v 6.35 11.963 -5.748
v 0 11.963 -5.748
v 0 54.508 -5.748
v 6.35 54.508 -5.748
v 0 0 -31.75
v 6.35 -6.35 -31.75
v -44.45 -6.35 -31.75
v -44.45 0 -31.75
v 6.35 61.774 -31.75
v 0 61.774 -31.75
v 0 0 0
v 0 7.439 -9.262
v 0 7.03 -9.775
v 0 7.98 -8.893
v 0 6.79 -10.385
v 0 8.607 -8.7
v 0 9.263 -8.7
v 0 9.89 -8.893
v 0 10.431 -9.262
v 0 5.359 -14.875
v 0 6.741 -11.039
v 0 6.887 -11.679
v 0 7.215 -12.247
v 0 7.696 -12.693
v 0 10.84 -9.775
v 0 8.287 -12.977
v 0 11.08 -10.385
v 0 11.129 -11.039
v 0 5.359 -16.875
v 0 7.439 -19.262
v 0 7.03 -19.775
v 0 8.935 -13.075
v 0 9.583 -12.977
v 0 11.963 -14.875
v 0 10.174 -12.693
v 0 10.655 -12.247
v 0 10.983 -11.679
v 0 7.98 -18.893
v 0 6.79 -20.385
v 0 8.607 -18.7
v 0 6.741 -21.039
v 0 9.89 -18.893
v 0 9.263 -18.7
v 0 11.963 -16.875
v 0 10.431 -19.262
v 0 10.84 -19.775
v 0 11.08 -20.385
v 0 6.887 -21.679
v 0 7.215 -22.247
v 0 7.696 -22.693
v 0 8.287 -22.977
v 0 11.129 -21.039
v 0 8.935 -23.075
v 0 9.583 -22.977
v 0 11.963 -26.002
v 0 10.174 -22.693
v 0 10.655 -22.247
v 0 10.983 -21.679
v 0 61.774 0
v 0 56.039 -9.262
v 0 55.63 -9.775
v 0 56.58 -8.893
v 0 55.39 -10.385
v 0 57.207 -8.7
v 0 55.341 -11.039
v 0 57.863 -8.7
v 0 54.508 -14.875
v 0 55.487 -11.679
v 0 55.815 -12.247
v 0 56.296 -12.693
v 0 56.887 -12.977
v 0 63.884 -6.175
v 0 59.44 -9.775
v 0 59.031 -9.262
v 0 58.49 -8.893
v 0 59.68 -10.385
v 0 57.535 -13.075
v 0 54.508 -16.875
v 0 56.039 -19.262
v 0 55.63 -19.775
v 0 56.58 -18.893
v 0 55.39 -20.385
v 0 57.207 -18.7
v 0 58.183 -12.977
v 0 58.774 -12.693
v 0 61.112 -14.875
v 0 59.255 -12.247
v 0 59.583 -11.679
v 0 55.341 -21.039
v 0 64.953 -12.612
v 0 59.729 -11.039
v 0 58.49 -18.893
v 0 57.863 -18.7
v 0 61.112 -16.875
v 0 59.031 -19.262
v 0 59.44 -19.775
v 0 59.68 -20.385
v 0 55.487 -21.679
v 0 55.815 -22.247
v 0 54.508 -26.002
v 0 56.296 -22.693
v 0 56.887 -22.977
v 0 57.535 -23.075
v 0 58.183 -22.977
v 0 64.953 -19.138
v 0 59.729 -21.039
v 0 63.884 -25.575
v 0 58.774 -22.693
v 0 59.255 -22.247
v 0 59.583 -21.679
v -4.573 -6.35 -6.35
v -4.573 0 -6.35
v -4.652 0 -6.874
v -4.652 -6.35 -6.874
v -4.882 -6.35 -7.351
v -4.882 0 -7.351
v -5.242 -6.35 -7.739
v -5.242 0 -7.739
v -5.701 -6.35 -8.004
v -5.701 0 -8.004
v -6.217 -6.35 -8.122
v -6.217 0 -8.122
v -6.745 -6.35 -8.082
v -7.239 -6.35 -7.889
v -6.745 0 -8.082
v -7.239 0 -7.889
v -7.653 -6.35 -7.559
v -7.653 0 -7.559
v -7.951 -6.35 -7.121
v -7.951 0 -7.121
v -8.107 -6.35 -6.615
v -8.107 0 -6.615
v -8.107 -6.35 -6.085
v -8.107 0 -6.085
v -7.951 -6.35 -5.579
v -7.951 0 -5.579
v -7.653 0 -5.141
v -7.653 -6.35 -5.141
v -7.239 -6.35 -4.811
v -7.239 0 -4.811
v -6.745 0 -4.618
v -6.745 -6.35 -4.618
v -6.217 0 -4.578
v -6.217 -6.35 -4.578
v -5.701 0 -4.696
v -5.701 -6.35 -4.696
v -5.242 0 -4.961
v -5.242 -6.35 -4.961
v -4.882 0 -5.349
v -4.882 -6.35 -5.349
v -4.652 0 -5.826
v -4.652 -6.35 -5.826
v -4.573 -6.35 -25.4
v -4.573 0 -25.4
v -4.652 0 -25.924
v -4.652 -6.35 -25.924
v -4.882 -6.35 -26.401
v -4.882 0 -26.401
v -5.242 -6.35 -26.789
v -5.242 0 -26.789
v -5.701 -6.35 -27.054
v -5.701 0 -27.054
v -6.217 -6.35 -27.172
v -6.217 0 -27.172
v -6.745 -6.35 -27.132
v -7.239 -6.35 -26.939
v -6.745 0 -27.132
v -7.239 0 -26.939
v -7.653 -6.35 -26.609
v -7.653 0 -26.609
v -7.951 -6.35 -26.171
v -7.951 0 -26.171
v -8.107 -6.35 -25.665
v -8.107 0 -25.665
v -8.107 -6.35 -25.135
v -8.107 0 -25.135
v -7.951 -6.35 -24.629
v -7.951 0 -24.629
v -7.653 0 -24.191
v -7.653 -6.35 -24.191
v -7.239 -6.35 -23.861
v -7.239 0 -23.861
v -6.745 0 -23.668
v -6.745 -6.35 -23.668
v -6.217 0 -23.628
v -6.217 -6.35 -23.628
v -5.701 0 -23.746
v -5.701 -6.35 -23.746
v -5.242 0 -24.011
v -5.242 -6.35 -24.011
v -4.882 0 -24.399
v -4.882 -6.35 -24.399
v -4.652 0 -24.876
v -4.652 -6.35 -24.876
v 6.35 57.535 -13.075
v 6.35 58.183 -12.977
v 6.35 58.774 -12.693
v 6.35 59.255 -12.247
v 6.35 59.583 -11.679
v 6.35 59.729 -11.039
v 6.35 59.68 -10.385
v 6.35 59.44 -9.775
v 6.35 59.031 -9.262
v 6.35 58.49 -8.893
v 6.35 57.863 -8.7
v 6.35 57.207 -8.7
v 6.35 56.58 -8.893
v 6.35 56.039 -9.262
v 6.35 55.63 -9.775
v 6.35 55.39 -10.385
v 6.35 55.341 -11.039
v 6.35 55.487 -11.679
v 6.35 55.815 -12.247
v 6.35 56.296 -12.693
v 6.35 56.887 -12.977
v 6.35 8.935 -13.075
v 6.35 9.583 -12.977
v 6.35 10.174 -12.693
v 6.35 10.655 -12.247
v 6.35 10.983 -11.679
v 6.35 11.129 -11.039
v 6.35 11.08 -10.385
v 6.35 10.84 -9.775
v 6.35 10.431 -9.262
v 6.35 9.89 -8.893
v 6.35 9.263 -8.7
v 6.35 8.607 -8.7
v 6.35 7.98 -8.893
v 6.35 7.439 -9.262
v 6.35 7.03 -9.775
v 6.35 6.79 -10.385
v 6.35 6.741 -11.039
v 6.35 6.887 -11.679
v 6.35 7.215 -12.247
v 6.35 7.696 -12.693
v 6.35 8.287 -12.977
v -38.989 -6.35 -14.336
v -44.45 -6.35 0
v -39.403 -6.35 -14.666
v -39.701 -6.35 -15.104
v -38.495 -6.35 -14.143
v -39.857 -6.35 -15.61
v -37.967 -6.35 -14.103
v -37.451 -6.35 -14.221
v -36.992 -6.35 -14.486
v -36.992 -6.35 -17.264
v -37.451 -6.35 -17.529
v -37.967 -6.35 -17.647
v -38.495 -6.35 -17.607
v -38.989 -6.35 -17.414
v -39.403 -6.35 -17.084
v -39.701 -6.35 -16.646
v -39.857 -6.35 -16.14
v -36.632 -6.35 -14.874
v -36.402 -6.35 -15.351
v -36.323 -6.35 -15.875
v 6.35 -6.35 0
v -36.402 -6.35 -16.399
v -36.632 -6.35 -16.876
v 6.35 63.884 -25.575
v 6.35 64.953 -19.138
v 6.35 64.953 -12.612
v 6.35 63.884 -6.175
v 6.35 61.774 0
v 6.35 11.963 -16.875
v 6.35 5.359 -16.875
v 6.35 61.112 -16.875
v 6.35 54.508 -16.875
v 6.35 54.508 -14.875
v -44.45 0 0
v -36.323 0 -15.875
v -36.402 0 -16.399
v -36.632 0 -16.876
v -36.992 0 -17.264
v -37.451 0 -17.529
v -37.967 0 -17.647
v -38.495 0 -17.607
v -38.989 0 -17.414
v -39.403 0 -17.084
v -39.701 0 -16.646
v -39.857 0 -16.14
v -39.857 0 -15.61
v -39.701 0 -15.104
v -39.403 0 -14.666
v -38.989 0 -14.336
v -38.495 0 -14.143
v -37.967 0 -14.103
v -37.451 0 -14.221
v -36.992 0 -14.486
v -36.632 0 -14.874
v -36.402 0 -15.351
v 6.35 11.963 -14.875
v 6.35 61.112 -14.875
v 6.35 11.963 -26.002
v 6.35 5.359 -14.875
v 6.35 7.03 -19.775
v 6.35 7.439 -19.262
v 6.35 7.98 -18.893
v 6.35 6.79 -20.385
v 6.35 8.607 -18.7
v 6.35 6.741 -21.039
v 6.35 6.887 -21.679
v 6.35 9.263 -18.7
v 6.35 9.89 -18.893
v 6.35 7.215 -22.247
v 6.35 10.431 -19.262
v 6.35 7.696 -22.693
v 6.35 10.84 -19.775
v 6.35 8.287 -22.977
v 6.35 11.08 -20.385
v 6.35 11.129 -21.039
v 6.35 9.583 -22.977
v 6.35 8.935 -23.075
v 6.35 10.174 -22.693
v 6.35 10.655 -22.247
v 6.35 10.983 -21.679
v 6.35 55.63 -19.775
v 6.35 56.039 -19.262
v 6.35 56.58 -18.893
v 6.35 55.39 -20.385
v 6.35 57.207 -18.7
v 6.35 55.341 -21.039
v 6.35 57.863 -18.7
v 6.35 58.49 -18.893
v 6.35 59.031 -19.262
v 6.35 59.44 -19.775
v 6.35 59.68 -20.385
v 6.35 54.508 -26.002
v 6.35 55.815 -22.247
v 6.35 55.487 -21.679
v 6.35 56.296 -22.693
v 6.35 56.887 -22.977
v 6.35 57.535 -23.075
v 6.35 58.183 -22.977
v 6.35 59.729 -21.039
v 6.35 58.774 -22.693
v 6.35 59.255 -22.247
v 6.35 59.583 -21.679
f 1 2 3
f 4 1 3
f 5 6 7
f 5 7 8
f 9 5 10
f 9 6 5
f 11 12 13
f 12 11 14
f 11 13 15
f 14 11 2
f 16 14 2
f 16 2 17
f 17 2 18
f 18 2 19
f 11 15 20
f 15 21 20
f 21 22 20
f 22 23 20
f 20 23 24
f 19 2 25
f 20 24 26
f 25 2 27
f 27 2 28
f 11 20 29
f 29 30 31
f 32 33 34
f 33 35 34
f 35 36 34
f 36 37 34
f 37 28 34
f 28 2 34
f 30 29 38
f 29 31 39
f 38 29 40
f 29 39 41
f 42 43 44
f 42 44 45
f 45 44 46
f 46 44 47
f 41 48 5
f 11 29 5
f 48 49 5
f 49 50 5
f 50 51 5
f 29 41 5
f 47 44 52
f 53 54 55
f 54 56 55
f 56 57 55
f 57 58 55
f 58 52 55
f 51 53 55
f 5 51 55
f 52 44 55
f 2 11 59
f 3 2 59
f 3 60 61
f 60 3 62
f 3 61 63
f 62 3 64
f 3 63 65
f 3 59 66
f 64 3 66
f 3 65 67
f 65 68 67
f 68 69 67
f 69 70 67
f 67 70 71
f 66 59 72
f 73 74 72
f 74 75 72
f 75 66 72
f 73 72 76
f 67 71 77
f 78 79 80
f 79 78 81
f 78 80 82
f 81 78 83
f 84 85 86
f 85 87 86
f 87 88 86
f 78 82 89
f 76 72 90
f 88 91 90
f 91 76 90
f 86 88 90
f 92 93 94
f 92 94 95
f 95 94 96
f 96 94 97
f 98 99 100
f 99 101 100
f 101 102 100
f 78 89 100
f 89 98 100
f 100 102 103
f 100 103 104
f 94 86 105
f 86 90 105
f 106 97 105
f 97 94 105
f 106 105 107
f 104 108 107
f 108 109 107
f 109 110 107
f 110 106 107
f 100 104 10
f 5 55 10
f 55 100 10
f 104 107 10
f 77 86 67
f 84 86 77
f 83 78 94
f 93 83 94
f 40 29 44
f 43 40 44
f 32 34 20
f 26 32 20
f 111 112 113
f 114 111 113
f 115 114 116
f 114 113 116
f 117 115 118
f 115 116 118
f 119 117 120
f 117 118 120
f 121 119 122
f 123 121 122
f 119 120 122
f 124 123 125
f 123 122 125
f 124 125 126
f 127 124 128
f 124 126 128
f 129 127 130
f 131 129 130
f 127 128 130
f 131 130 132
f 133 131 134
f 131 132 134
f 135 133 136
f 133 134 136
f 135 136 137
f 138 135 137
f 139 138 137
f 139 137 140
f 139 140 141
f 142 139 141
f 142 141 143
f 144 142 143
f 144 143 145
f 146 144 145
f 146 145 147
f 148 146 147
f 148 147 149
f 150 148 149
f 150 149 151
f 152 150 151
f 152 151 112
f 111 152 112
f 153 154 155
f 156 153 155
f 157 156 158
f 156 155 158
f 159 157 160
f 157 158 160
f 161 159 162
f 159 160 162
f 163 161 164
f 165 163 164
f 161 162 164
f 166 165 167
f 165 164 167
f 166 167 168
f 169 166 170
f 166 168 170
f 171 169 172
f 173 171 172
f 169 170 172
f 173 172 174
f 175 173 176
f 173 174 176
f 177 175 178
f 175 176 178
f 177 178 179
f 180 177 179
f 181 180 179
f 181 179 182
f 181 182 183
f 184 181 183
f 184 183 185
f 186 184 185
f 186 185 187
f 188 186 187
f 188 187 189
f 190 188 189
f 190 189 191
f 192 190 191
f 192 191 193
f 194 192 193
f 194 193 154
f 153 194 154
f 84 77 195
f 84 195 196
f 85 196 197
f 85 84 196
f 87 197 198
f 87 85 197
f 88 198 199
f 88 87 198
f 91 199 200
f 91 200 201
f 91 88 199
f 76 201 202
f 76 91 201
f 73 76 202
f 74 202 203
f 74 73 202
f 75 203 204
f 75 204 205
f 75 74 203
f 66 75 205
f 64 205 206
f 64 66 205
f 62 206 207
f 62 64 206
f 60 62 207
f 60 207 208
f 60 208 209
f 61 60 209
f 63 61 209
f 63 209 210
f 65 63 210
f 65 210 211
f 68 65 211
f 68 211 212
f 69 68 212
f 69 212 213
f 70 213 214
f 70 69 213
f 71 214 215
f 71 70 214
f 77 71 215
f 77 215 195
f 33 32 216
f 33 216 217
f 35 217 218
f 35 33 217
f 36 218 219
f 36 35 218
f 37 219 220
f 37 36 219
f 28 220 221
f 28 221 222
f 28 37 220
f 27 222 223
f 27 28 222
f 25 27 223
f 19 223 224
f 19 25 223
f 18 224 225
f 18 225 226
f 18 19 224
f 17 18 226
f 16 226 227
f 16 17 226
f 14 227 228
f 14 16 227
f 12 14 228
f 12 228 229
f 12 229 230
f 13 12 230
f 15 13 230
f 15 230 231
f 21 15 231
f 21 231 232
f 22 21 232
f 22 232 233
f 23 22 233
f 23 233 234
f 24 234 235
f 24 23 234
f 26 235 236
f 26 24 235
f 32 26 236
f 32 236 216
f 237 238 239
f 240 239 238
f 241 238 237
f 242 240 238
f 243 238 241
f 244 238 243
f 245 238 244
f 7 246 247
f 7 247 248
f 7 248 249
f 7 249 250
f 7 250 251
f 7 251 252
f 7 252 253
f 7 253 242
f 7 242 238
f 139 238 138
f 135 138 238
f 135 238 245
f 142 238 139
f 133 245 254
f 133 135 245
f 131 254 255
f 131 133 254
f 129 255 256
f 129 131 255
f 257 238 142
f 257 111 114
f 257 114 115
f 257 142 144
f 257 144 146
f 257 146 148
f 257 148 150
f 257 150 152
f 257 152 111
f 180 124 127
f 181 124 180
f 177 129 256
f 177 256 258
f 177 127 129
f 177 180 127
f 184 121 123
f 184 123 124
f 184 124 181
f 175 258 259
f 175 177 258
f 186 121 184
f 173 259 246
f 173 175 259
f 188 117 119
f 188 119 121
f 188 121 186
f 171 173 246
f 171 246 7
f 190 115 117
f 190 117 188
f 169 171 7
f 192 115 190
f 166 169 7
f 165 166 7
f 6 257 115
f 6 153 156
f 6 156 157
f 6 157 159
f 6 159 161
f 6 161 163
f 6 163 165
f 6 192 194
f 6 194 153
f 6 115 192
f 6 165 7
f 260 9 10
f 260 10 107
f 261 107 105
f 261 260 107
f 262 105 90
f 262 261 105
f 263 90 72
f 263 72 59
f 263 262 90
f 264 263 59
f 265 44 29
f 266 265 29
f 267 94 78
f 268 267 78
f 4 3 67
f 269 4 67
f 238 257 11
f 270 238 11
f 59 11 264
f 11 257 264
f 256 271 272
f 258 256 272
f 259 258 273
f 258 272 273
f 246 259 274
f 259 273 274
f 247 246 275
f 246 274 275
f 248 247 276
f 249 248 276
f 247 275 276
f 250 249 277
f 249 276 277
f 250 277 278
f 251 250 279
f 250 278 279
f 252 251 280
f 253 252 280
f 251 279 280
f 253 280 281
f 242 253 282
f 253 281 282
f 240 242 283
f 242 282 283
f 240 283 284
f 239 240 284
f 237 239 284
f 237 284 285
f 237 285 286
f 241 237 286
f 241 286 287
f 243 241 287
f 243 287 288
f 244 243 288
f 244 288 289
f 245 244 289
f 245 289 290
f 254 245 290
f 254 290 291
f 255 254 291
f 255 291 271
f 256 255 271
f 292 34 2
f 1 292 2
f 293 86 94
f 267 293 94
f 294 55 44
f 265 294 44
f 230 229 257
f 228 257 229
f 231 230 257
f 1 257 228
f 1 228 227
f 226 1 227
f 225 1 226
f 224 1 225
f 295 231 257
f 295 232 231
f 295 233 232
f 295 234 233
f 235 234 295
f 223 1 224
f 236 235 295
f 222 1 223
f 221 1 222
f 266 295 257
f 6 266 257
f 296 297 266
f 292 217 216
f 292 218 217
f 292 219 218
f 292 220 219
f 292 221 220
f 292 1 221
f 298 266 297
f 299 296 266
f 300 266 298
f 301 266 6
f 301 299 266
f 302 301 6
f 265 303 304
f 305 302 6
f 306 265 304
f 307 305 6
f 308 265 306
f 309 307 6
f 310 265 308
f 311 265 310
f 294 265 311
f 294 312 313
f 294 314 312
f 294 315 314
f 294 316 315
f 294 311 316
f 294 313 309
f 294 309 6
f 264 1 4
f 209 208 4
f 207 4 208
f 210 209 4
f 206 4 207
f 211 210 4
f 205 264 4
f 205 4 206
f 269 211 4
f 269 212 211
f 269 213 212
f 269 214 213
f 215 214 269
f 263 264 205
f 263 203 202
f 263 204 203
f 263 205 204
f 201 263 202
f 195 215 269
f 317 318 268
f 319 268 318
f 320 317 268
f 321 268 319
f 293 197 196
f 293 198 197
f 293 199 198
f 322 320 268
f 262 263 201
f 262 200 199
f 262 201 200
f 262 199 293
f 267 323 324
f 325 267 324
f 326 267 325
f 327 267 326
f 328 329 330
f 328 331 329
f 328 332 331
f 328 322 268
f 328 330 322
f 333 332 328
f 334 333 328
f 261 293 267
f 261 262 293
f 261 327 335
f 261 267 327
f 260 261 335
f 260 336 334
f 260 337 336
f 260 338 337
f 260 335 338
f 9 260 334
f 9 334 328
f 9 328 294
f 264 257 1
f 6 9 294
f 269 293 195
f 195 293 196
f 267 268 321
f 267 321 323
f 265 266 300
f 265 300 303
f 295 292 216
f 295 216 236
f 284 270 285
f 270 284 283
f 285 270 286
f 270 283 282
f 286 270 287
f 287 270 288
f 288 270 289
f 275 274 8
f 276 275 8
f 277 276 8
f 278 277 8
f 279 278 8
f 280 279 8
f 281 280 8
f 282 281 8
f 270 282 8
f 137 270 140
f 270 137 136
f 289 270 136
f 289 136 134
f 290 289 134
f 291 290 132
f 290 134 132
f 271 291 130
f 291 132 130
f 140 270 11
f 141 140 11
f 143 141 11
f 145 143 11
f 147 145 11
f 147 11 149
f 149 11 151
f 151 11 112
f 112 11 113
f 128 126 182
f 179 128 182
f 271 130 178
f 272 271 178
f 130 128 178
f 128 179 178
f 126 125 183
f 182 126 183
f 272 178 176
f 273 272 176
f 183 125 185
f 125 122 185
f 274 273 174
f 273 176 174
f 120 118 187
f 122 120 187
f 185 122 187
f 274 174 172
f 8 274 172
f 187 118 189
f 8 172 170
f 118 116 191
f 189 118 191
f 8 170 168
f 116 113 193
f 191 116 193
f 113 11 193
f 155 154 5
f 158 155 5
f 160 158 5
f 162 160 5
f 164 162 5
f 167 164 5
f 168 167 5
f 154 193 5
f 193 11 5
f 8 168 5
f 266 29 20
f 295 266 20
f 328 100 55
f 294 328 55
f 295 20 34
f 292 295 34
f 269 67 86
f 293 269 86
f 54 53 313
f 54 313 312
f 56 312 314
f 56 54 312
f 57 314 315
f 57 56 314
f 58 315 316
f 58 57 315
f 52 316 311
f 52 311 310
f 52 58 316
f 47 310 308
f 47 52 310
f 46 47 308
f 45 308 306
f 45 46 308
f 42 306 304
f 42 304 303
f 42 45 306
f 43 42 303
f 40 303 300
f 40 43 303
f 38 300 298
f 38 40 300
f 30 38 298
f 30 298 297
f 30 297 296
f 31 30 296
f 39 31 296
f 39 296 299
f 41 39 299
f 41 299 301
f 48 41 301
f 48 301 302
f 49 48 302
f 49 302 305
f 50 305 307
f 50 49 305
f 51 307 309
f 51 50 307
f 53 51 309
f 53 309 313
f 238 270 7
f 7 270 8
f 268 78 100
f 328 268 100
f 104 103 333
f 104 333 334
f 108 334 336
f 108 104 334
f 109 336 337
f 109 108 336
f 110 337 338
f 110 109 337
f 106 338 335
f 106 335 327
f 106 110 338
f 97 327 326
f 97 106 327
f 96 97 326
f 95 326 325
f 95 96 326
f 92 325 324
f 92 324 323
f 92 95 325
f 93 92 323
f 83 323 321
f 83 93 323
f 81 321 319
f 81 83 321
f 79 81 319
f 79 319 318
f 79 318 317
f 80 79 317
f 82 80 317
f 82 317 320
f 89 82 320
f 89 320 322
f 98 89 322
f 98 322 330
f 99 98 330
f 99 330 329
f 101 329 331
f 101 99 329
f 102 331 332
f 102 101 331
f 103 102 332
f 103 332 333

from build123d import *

# Parameters (mm, degrees)
SKETCH3_W           = 31.75
SKETCH3_H           = 67.207500078
SKETCH3_R           = 2.200000045
BOSS_EXTRUDE1_DEPTH = 6.35
SKETCH5_W           = 31.75
SKETCH5_H           = 6.35
BOSS_EXTRUDE2_DEPTH = 50.8
SKETCH6_R           = 1.777000002
CUT_EXTRUDE1_DEPTH  = 7.35
CUT_EXTRUDE2_DEPTH  = 51.8


with BuildPart() as part:
    # Sketch3 → Boss-Extrude1 (new body)
    with BuildSketch(Plane(origin=(0, 0, 0), x_dir=(0, 0, -1), z_dir=(1, 0, 0))):
        with Locations((15.875, 33.603750039)):
            Rectangle(SKETCH3_W, SKETCH3_H)
        with Locations((10.874999967, 8.935000037)):
            Circle(SKETCH3_R, mode=Mode.SUBTRACT)
        with Locations((20.875000033, 8.935000037)):
            Circle(SKETCH3_R, mode=Mode.SUBTRACT)
        with Locations((10.874999967, 57.535000119)):
            Circle(SKETCH3_R, mode=Mode.SUBTRACT)
        with Locations((20.875000033, 57.535000119)):
            Circle(SKETCH3_R, mode=Mode.SUBTRACT)
        Polygon((5.748000061, 54.507500078), (14.875, 54.507500078), (14.875, 61.111500078), (16.875, 61.111500078), (16.875, 54.507500078), (26.001999939, 54.507500078), (26.001999939, 11.962500078), (16.875, 11.962500078), (16.875, 5.358500078), (14.875, 5.358500078), (14.875, 11.962500078), (5.748000061, 11.962500078), align=None, mode=Mode.SUBTRACT)
    extrude(amount=BOSS_EXTRUDE1_DEPTH)

    # Sketch5 → Boss-Extrude2 (add)
    with BuildSketch(Plane(origin=(6.35, 0, 0), x_dir=(0, 0, -1), z_dir=(1, 0, 0))):
        with Locations((15.875, -3.175)):
            Rectangle(SKETCH5_W, SKETCH5_H)
    extrude(amount=-BOSS_EXTRUDE2_DEPTH)

    # Sketch6 → Cut-Extrude1 (cut, through all)
    with BuildSketch(Plane(origin=(0, 0, 0), x_dir=(1, 0, 0), z_dir=(0, 1, 0))):
        with Locations((-6.35, 6.35)):
            Circle(SKETCH6_R)
        with Locations((-38.1, 15.875)):
            Circle(SKETCH6_R)
        with Locations((-6.35, 25.4)):
            Circle(SKETCH6_R)
    extrude(amount=-CUT_EXTRUDE1_DEPTH, mode=Mode.SUBTRACT)

    # Sketch7 → Cut-Extrude2 (cut, through all)
    with BuildSketch(Plane(origin=(6.35, 0, 0), x_dir=(0, 0, -1), z_dir=(1, 0, 0))):
        with BuildLine():
            Line((0, 61.774194579), (0, 82.748877538))
            Line((0, 82.748877538), (31.75, 82.748877538))
            Line((31.75, 82.748877538), (31.75, 61.774194579))
            ThreePointArc((31.75, 61.774194579), (15.875, 65.0875), (0, 61.774194579))
        make_face()
    extrude(amount=-CUT_EXTRUDE2_DEPTH, mode=Mode.SUBTRACT)


solid = part.part
